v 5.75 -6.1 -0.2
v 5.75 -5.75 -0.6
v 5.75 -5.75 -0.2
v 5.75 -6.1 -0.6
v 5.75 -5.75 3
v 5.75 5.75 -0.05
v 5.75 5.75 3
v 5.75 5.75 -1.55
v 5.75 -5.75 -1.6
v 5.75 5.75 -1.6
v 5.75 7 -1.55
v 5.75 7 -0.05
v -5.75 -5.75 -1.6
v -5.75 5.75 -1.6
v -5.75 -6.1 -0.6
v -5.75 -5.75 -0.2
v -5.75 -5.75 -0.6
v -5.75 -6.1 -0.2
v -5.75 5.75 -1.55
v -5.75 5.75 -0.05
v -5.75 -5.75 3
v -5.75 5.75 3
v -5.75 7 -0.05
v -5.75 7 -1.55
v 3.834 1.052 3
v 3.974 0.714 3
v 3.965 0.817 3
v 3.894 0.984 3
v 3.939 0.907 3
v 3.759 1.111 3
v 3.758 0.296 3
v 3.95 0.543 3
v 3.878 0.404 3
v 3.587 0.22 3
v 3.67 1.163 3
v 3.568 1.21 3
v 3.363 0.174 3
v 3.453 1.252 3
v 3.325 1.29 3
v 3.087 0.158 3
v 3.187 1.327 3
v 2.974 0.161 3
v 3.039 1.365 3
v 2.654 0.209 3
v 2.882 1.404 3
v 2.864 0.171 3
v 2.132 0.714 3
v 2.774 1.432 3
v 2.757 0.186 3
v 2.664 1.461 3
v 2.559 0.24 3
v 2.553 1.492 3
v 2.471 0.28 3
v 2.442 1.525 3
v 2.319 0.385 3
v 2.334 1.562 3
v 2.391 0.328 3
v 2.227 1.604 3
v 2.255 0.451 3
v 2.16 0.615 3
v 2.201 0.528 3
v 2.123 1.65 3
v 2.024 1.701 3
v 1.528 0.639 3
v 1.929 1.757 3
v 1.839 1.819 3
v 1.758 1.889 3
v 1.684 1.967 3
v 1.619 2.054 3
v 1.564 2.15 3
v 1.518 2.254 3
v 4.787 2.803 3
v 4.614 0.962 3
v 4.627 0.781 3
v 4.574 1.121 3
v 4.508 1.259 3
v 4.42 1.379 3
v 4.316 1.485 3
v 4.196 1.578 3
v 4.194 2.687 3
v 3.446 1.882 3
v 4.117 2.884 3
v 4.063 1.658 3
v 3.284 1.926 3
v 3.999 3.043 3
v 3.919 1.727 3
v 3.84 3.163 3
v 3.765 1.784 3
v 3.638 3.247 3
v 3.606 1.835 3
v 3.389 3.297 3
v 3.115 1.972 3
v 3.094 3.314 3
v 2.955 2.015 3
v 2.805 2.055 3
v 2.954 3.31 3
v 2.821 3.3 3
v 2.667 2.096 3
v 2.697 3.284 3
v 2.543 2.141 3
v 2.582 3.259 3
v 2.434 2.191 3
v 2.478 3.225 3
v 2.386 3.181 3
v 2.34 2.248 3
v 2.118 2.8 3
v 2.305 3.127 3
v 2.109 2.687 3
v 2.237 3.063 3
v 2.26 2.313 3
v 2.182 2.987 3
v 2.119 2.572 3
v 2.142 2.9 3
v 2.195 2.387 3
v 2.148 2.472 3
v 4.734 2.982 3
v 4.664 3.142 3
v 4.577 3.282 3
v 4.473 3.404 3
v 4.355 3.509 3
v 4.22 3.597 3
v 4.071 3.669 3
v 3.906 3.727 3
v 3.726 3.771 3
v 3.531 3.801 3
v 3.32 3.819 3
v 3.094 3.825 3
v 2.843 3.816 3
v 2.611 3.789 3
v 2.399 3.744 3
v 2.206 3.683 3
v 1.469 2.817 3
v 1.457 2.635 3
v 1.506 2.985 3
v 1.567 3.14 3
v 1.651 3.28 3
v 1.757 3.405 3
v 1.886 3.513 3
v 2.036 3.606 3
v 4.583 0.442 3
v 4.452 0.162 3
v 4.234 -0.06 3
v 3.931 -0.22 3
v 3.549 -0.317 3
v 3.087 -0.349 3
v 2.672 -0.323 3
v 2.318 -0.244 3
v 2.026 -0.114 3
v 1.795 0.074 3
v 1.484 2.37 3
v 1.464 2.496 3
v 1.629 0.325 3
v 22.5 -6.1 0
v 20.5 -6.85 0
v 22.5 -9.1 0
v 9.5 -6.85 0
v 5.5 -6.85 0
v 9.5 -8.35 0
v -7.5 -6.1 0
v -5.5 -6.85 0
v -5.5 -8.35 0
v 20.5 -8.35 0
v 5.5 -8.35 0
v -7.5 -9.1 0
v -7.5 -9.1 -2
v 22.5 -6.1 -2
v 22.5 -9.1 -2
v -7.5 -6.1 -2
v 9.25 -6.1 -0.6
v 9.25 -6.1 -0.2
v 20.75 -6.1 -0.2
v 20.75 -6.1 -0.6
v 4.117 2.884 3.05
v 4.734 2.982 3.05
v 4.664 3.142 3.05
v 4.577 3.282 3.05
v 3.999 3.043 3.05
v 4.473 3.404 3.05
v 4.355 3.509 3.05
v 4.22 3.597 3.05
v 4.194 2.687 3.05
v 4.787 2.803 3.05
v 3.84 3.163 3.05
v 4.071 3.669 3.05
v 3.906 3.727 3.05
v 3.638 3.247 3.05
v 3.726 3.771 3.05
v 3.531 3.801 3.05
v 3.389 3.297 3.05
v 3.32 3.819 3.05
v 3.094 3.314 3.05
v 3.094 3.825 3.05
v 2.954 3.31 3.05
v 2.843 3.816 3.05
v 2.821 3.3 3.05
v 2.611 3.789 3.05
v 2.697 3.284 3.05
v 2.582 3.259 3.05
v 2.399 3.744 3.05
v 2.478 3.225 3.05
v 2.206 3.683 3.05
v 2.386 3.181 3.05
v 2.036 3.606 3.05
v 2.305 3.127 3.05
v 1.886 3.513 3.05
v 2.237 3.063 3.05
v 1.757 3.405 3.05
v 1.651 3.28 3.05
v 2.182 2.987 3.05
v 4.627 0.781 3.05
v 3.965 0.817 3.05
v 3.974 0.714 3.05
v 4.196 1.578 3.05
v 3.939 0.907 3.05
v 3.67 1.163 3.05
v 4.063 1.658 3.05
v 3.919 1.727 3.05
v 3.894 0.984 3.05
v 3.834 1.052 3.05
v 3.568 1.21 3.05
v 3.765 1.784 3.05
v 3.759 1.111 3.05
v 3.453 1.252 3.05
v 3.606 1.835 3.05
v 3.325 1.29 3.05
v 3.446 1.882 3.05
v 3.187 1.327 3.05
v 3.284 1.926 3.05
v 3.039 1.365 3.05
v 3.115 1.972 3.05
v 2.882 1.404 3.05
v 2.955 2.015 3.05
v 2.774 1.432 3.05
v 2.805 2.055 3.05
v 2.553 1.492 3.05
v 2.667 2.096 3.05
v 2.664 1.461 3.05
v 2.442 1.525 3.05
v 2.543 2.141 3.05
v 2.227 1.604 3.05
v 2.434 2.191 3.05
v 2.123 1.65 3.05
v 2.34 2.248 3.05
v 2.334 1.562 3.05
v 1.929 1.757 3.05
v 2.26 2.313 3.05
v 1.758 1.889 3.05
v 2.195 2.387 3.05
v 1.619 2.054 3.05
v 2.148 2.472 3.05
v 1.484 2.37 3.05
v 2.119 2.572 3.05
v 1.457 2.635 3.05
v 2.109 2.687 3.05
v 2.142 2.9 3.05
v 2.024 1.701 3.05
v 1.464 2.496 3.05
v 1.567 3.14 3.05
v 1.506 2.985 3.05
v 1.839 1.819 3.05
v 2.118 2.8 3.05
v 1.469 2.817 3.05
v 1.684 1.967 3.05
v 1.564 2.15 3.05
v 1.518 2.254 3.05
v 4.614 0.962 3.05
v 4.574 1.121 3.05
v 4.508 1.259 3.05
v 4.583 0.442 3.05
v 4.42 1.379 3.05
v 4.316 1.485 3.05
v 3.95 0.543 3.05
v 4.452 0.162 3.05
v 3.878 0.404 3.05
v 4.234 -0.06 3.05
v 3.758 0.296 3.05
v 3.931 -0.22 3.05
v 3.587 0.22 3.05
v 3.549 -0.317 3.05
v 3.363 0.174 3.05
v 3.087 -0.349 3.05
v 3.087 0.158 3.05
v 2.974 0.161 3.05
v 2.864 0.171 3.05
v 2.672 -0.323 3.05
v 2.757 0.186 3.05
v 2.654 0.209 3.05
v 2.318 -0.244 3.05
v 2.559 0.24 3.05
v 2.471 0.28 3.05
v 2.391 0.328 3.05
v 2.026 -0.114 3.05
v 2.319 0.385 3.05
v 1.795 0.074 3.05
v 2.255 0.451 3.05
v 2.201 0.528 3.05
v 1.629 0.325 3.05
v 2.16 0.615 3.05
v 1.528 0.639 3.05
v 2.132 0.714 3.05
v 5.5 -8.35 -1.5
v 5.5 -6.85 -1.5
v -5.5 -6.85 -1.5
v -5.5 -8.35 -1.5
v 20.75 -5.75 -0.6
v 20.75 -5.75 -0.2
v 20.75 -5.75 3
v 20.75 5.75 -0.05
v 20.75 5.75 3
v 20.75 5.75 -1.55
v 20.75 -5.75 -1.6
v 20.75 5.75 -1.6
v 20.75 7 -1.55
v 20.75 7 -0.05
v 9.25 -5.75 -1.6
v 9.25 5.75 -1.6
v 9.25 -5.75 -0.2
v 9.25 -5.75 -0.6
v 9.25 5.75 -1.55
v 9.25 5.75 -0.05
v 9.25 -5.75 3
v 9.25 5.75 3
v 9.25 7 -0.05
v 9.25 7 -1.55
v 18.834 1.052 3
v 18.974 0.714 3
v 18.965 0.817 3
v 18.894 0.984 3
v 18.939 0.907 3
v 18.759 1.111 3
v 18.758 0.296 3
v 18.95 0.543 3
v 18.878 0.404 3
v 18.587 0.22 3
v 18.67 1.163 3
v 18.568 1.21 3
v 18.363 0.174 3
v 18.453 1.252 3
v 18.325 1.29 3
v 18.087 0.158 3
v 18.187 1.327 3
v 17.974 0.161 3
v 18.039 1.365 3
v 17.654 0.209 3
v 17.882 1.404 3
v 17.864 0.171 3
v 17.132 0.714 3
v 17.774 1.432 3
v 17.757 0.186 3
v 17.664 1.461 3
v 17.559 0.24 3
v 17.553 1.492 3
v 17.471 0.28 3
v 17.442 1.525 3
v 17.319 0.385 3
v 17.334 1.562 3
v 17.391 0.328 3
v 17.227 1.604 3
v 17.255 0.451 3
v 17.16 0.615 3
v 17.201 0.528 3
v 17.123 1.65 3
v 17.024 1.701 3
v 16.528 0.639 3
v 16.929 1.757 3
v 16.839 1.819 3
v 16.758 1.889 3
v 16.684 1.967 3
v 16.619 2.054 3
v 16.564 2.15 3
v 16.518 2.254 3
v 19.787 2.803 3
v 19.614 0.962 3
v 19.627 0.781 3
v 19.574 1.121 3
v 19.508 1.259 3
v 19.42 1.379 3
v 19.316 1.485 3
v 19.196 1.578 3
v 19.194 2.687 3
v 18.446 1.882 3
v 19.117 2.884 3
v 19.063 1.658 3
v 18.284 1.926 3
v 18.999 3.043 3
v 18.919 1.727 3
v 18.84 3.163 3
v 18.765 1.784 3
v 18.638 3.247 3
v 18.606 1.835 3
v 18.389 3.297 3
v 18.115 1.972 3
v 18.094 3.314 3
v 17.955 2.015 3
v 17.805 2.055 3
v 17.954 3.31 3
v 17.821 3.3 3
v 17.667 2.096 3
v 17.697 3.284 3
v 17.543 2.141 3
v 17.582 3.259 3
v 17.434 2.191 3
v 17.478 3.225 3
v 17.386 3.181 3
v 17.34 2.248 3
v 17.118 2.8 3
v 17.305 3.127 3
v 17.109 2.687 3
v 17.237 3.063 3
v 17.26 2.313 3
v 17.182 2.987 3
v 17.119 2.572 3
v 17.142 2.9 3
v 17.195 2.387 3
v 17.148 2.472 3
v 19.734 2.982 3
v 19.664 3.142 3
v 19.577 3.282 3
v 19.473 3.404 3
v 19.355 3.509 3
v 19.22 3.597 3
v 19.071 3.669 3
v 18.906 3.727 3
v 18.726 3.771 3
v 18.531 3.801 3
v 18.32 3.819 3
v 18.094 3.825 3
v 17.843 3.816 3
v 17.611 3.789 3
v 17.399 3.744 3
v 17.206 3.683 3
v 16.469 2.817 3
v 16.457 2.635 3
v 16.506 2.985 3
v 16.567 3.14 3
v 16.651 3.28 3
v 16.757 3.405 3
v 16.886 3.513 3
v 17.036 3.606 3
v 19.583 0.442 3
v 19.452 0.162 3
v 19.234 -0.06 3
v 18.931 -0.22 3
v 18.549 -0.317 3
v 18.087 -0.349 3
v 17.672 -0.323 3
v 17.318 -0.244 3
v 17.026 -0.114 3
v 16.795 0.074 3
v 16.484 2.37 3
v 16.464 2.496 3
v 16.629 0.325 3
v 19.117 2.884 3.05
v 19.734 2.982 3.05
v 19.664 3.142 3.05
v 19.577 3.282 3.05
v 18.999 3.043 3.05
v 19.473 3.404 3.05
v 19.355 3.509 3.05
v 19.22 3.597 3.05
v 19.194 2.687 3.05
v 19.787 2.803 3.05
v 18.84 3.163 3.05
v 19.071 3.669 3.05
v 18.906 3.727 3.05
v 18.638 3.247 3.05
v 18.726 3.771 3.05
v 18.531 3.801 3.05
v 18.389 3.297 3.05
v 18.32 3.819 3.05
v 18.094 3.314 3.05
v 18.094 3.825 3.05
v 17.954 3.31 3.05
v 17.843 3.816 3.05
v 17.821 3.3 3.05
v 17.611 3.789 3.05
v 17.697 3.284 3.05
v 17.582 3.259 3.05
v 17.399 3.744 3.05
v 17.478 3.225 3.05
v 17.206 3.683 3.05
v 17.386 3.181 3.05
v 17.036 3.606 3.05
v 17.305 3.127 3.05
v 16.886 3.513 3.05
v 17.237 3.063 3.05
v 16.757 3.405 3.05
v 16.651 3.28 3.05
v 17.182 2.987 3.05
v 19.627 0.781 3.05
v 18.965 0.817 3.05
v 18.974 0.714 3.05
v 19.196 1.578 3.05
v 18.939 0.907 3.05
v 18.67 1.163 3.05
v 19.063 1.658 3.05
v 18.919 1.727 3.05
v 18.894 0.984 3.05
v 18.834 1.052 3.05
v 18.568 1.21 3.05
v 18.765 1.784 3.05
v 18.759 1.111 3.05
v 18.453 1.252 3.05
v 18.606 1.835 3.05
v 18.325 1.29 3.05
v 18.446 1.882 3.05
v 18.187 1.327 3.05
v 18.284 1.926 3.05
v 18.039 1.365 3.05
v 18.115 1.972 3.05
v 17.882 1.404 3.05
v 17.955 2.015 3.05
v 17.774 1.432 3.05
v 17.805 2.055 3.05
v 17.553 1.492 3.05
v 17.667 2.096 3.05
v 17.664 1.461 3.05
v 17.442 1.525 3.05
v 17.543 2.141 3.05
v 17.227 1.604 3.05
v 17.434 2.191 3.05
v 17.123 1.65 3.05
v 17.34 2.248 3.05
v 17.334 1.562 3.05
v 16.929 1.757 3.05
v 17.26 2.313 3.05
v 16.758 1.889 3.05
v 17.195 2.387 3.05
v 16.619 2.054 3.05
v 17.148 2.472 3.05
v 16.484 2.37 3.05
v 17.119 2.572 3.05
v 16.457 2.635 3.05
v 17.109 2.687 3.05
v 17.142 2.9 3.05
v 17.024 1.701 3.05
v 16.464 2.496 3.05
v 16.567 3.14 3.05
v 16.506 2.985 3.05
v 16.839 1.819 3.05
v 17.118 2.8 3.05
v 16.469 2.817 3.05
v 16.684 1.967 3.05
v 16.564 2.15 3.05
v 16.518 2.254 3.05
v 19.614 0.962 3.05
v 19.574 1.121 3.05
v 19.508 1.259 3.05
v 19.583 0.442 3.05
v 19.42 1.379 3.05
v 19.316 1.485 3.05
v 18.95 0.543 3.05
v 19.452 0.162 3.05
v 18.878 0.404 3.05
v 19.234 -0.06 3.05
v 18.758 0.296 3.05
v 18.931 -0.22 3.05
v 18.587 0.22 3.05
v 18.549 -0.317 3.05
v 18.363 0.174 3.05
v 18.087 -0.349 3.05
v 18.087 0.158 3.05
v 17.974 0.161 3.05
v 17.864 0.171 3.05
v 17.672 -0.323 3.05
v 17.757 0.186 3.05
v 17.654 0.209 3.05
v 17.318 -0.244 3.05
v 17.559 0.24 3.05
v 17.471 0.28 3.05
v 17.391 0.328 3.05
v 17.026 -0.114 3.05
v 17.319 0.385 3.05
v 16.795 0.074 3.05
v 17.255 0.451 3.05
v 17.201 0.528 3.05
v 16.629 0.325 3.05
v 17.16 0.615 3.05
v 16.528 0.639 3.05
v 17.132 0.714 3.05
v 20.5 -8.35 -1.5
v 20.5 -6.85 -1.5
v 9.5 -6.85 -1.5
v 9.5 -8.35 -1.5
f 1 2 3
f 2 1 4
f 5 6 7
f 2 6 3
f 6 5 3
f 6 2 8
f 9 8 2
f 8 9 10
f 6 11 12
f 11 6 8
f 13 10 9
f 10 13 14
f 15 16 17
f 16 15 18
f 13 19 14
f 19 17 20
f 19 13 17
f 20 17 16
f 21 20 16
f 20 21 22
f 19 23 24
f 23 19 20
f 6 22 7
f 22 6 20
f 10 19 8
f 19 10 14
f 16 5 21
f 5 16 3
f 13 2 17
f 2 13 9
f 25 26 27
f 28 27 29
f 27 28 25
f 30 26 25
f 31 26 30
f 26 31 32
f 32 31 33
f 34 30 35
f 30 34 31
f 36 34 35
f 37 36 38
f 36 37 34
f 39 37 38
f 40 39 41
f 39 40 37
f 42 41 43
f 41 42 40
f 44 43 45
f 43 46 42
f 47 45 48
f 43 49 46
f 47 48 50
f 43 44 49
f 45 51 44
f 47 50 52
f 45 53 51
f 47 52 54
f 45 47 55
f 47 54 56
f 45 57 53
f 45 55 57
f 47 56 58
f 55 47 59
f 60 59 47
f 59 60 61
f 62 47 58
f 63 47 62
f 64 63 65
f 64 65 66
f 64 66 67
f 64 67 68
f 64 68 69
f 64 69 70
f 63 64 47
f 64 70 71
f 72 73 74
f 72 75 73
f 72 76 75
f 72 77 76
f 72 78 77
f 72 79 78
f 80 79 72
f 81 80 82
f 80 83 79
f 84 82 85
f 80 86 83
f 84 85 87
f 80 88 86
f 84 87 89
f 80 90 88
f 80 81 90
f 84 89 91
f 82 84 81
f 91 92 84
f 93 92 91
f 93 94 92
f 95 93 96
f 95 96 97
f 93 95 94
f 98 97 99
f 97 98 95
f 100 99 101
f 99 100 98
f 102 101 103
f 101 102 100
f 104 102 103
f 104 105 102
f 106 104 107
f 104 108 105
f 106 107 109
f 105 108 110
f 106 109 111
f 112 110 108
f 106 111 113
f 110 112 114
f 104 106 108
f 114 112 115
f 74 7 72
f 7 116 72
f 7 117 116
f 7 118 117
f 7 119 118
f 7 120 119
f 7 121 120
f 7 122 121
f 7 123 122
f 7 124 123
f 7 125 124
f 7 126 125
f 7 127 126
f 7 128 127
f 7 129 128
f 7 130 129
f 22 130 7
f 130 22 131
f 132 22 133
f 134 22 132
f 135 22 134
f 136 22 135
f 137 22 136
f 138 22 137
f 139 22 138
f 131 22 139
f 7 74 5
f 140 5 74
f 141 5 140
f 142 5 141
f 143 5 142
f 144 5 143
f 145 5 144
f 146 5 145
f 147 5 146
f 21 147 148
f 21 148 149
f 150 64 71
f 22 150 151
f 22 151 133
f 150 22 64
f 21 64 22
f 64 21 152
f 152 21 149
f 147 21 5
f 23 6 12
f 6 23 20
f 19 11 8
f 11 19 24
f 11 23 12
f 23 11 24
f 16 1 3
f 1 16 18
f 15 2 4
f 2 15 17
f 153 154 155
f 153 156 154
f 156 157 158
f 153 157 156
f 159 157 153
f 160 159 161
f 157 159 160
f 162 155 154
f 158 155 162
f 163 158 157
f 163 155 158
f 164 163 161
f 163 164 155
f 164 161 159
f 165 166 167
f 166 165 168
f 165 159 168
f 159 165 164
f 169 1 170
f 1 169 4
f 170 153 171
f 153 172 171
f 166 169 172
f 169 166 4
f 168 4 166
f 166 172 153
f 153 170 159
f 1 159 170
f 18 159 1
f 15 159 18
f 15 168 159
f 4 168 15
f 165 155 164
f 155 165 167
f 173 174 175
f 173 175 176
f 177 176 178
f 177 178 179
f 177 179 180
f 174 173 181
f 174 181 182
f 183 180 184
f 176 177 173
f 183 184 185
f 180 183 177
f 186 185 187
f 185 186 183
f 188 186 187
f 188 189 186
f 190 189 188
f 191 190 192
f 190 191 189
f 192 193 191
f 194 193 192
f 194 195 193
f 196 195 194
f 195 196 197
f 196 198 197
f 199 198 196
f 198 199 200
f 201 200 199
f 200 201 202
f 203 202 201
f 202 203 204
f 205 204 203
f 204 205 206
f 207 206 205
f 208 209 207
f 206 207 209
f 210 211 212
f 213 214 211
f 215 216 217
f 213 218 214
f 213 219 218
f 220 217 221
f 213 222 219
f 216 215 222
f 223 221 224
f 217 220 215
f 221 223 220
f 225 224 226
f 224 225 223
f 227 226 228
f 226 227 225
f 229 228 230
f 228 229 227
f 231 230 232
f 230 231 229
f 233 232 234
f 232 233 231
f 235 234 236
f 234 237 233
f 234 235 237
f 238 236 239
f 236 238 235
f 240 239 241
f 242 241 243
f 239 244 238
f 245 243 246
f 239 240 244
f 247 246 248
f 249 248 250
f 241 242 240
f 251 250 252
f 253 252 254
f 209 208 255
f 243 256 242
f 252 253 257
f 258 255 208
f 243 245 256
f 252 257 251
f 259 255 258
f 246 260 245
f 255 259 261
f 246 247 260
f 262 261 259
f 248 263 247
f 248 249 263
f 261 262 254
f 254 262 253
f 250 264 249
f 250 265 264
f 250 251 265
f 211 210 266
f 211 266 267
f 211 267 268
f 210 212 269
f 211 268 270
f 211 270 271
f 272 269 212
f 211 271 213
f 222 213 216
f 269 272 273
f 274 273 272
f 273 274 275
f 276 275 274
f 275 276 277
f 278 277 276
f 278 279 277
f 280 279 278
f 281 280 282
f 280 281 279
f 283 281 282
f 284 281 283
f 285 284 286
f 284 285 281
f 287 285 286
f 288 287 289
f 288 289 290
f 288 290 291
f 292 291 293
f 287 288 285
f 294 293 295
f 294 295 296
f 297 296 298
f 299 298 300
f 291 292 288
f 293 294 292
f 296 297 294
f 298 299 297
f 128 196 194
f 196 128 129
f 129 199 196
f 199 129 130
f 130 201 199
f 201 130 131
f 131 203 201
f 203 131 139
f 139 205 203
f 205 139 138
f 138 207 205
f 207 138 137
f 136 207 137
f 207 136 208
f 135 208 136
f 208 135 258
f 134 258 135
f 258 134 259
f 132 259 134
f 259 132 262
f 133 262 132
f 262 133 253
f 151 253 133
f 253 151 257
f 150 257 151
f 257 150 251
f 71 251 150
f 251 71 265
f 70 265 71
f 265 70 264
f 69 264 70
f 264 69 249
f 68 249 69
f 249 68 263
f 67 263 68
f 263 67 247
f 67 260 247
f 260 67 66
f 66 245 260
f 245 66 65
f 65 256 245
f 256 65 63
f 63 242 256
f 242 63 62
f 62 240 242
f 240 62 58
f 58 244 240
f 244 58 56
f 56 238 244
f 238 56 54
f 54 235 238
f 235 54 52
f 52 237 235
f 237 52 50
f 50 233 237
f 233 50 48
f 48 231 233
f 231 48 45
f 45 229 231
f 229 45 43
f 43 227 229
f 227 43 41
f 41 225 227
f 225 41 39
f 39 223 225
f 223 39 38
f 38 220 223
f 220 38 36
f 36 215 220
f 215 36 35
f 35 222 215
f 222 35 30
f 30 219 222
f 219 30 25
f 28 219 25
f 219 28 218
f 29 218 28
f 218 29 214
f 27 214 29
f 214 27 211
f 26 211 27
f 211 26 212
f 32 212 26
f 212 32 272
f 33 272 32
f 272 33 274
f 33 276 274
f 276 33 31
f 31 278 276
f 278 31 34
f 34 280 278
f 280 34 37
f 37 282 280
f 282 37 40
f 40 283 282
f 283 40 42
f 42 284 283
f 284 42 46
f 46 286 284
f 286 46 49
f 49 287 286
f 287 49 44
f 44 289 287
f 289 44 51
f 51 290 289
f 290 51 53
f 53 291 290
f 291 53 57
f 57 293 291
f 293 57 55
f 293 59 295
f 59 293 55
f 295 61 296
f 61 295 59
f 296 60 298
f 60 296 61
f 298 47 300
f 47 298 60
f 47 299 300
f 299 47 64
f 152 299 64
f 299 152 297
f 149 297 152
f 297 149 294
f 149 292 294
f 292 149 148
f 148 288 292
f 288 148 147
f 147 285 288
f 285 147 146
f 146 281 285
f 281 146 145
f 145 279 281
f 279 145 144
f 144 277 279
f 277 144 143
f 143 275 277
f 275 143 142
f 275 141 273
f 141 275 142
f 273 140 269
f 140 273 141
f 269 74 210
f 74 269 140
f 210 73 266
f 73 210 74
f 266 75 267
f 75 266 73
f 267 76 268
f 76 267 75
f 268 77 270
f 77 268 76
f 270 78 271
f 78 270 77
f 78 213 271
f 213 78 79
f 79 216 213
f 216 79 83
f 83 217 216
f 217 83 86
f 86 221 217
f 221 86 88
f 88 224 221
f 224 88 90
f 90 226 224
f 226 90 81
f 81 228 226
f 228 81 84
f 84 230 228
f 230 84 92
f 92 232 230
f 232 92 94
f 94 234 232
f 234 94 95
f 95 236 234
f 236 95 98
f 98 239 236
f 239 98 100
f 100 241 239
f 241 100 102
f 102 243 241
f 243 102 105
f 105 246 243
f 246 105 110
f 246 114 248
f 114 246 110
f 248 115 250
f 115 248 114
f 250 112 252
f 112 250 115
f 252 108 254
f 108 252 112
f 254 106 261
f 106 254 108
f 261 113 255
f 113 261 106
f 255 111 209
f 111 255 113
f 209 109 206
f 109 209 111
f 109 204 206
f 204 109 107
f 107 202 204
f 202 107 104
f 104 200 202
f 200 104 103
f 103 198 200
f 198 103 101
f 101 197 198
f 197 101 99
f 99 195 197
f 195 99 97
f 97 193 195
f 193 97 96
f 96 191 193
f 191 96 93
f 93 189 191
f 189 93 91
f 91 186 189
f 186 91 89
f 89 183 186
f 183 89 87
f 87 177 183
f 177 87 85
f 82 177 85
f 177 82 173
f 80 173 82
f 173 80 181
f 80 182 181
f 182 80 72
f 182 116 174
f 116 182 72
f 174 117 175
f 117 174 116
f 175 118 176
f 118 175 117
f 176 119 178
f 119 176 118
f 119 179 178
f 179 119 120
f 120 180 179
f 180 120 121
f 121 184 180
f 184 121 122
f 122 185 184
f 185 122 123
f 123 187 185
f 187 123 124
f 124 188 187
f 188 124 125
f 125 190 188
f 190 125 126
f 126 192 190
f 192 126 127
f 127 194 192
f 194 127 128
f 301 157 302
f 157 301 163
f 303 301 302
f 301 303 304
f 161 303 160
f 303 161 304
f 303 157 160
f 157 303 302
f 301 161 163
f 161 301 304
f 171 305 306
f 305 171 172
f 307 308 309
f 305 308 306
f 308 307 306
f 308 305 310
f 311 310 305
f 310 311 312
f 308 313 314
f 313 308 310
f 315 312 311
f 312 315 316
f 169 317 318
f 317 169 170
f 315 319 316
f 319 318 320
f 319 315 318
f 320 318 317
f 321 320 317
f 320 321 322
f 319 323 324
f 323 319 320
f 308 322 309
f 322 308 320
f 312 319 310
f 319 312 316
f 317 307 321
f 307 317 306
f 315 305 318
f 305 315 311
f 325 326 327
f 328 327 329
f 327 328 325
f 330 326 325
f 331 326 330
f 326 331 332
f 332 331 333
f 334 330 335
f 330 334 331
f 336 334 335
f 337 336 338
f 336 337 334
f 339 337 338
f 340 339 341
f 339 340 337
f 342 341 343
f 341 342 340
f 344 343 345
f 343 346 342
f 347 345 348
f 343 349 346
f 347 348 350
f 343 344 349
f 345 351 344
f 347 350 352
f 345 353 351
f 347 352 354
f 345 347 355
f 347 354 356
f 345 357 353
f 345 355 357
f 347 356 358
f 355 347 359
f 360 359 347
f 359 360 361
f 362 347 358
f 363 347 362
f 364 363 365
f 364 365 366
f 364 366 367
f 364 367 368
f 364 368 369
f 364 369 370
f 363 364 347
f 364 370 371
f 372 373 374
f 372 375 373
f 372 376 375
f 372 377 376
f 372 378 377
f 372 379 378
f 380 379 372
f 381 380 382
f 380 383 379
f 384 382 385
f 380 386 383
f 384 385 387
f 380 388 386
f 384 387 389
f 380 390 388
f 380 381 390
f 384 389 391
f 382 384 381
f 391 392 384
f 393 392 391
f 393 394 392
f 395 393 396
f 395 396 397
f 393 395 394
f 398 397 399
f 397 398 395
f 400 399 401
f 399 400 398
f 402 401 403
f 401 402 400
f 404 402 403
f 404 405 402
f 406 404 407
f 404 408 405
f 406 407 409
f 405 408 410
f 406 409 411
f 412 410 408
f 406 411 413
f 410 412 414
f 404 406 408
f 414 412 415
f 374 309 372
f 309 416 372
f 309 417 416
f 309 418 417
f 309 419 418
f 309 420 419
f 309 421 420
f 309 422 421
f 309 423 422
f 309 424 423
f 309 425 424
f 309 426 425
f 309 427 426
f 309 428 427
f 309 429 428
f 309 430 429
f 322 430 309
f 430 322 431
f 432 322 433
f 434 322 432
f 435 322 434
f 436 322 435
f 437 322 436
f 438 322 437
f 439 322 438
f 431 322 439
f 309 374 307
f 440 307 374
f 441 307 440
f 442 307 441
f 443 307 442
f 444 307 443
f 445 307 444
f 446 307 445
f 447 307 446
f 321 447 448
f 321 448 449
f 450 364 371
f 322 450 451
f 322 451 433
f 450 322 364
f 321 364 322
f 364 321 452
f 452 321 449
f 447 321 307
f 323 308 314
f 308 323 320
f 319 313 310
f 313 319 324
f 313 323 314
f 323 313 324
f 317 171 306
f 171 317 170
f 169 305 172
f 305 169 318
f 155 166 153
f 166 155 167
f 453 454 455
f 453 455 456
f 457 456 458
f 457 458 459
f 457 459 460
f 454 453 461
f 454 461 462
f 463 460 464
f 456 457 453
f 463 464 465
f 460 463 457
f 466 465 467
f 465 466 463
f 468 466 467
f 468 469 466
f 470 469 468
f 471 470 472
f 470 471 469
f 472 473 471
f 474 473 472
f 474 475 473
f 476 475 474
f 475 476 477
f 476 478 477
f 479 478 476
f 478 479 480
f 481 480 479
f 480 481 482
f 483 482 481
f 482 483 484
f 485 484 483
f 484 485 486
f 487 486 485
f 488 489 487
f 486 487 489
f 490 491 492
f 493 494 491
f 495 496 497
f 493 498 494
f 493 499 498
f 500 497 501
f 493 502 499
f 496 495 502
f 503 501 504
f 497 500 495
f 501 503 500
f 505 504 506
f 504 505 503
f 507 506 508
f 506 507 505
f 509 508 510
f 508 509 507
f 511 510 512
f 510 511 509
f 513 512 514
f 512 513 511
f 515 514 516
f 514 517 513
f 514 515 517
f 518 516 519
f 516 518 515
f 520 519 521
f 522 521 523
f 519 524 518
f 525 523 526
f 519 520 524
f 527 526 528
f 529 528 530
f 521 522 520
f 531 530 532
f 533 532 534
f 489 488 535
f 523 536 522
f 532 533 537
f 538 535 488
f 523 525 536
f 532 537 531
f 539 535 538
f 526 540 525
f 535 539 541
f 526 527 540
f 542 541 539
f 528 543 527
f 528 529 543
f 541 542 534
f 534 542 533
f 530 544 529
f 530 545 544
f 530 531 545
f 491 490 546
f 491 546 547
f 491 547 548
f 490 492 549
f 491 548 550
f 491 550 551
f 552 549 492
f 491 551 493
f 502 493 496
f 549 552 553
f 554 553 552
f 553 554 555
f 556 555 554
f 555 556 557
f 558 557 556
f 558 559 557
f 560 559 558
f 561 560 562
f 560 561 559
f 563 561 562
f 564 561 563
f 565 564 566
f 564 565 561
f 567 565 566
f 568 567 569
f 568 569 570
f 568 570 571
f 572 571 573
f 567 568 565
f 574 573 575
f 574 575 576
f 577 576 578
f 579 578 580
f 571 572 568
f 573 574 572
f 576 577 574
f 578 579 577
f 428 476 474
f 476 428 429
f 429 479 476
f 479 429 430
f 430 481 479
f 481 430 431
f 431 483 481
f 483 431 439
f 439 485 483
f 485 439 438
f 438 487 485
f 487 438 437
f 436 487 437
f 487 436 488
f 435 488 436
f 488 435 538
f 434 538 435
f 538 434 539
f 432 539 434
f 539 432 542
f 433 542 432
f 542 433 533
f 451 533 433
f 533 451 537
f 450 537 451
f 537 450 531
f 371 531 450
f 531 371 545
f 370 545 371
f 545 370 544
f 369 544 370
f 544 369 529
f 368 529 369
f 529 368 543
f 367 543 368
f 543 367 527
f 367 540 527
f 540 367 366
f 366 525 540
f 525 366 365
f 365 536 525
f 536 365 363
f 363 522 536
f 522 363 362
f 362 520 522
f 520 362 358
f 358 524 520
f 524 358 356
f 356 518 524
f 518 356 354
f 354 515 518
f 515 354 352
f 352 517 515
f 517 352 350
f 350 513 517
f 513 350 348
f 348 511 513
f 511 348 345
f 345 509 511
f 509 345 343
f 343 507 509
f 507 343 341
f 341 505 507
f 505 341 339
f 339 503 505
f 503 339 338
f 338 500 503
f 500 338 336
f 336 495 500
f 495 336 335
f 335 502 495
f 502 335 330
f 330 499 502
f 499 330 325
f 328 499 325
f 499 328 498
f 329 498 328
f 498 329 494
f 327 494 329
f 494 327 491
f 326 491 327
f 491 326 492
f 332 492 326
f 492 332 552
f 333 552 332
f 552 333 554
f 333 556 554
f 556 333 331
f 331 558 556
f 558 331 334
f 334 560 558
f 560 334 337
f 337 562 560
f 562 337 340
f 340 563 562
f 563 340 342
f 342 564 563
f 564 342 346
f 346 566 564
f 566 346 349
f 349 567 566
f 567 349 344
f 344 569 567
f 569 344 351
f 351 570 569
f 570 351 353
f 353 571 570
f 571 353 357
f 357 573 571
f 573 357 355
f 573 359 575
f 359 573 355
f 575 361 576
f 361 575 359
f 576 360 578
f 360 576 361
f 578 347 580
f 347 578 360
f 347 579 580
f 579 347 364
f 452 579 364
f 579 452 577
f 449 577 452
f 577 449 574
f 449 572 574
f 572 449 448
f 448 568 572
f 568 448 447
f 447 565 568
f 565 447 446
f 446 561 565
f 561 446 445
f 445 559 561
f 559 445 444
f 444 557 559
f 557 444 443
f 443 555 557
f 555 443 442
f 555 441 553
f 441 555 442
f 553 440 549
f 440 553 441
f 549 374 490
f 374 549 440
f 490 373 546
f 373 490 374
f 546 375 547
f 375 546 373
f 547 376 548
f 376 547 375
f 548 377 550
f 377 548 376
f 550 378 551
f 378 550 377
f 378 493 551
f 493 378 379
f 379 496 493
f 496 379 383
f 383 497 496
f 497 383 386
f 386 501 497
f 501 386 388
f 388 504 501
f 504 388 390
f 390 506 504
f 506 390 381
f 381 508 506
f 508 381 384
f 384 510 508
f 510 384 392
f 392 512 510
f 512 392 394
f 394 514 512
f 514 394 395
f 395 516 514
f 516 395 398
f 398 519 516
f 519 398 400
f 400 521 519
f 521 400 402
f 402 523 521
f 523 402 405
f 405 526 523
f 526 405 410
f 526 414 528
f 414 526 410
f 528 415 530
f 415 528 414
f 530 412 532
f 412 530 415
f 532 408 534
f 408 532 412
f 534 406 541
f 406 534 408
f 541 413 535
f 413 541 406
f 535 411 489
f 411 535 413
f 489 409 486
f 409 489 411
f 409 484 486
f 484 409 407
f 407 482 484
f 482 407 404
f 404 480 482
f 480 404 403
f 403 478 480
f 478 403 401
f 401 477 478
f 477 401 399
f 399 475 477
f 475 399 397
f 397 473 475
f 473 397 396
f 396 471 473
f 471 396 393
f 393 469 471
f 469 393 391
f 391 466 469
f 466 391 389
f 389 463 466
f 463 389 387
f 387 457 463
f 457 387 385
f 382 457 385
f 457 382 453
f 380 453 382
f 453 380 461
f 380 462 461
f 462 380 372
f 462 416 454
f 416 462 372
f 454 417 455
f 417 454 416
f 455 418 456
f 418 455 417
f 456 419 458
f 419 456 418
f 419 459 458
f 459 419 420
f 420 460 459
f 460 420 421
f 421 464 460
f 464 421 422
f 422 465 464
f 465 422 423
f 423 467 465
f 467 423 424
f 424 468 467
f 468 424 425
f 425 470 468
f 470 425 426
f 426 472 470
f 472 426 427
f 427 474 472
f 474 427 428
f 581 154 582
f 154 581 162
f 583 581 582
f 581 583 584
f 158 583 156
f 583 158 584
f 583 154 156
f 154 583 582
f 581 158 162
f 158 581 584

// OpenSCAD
numb=2;
cap=["s","s"];

   for (i=[0:numb-1])
   {

difference() {

   union () {
    translate ([i*15,0,-1.5+1.4]) cube ( [11.5,11.5,3], center = true ); //buttons below panel

    translate ([i*15,0,-1.5+3]) cube ( [11.5,11.5,3], center = true ); //buttons above panel

    translate ([i*15,6,-0.8]) cube ( [11.5,2,1.5], center = true ); //stop below

    translate ([i*15,-6.5,-0.4]) cube ( [11.5,3,0.4], center = true ); //hinge

    translate ([i*15,-7.6,-1]) cube ( [15,3,2], center = true ); //mount bar

    translate([i*15+5, 3.75, 2.65]) linear_extrude(0.4) rotate([0,0,180]) text(cap[i],size=5.5);



   //translate ([0,-8.5,0.7]) cube ( [49,4,1.4], center = true ); //buttons

   //translate ([0,-6.5,-0.4]) cube ( [49,4,3], center = true ); //buttons


   };



   translate ([i*15,-7.6,-0.75]) cube ( [11,1.5,1.5], center = true ); //locating recess

   };

   
};
